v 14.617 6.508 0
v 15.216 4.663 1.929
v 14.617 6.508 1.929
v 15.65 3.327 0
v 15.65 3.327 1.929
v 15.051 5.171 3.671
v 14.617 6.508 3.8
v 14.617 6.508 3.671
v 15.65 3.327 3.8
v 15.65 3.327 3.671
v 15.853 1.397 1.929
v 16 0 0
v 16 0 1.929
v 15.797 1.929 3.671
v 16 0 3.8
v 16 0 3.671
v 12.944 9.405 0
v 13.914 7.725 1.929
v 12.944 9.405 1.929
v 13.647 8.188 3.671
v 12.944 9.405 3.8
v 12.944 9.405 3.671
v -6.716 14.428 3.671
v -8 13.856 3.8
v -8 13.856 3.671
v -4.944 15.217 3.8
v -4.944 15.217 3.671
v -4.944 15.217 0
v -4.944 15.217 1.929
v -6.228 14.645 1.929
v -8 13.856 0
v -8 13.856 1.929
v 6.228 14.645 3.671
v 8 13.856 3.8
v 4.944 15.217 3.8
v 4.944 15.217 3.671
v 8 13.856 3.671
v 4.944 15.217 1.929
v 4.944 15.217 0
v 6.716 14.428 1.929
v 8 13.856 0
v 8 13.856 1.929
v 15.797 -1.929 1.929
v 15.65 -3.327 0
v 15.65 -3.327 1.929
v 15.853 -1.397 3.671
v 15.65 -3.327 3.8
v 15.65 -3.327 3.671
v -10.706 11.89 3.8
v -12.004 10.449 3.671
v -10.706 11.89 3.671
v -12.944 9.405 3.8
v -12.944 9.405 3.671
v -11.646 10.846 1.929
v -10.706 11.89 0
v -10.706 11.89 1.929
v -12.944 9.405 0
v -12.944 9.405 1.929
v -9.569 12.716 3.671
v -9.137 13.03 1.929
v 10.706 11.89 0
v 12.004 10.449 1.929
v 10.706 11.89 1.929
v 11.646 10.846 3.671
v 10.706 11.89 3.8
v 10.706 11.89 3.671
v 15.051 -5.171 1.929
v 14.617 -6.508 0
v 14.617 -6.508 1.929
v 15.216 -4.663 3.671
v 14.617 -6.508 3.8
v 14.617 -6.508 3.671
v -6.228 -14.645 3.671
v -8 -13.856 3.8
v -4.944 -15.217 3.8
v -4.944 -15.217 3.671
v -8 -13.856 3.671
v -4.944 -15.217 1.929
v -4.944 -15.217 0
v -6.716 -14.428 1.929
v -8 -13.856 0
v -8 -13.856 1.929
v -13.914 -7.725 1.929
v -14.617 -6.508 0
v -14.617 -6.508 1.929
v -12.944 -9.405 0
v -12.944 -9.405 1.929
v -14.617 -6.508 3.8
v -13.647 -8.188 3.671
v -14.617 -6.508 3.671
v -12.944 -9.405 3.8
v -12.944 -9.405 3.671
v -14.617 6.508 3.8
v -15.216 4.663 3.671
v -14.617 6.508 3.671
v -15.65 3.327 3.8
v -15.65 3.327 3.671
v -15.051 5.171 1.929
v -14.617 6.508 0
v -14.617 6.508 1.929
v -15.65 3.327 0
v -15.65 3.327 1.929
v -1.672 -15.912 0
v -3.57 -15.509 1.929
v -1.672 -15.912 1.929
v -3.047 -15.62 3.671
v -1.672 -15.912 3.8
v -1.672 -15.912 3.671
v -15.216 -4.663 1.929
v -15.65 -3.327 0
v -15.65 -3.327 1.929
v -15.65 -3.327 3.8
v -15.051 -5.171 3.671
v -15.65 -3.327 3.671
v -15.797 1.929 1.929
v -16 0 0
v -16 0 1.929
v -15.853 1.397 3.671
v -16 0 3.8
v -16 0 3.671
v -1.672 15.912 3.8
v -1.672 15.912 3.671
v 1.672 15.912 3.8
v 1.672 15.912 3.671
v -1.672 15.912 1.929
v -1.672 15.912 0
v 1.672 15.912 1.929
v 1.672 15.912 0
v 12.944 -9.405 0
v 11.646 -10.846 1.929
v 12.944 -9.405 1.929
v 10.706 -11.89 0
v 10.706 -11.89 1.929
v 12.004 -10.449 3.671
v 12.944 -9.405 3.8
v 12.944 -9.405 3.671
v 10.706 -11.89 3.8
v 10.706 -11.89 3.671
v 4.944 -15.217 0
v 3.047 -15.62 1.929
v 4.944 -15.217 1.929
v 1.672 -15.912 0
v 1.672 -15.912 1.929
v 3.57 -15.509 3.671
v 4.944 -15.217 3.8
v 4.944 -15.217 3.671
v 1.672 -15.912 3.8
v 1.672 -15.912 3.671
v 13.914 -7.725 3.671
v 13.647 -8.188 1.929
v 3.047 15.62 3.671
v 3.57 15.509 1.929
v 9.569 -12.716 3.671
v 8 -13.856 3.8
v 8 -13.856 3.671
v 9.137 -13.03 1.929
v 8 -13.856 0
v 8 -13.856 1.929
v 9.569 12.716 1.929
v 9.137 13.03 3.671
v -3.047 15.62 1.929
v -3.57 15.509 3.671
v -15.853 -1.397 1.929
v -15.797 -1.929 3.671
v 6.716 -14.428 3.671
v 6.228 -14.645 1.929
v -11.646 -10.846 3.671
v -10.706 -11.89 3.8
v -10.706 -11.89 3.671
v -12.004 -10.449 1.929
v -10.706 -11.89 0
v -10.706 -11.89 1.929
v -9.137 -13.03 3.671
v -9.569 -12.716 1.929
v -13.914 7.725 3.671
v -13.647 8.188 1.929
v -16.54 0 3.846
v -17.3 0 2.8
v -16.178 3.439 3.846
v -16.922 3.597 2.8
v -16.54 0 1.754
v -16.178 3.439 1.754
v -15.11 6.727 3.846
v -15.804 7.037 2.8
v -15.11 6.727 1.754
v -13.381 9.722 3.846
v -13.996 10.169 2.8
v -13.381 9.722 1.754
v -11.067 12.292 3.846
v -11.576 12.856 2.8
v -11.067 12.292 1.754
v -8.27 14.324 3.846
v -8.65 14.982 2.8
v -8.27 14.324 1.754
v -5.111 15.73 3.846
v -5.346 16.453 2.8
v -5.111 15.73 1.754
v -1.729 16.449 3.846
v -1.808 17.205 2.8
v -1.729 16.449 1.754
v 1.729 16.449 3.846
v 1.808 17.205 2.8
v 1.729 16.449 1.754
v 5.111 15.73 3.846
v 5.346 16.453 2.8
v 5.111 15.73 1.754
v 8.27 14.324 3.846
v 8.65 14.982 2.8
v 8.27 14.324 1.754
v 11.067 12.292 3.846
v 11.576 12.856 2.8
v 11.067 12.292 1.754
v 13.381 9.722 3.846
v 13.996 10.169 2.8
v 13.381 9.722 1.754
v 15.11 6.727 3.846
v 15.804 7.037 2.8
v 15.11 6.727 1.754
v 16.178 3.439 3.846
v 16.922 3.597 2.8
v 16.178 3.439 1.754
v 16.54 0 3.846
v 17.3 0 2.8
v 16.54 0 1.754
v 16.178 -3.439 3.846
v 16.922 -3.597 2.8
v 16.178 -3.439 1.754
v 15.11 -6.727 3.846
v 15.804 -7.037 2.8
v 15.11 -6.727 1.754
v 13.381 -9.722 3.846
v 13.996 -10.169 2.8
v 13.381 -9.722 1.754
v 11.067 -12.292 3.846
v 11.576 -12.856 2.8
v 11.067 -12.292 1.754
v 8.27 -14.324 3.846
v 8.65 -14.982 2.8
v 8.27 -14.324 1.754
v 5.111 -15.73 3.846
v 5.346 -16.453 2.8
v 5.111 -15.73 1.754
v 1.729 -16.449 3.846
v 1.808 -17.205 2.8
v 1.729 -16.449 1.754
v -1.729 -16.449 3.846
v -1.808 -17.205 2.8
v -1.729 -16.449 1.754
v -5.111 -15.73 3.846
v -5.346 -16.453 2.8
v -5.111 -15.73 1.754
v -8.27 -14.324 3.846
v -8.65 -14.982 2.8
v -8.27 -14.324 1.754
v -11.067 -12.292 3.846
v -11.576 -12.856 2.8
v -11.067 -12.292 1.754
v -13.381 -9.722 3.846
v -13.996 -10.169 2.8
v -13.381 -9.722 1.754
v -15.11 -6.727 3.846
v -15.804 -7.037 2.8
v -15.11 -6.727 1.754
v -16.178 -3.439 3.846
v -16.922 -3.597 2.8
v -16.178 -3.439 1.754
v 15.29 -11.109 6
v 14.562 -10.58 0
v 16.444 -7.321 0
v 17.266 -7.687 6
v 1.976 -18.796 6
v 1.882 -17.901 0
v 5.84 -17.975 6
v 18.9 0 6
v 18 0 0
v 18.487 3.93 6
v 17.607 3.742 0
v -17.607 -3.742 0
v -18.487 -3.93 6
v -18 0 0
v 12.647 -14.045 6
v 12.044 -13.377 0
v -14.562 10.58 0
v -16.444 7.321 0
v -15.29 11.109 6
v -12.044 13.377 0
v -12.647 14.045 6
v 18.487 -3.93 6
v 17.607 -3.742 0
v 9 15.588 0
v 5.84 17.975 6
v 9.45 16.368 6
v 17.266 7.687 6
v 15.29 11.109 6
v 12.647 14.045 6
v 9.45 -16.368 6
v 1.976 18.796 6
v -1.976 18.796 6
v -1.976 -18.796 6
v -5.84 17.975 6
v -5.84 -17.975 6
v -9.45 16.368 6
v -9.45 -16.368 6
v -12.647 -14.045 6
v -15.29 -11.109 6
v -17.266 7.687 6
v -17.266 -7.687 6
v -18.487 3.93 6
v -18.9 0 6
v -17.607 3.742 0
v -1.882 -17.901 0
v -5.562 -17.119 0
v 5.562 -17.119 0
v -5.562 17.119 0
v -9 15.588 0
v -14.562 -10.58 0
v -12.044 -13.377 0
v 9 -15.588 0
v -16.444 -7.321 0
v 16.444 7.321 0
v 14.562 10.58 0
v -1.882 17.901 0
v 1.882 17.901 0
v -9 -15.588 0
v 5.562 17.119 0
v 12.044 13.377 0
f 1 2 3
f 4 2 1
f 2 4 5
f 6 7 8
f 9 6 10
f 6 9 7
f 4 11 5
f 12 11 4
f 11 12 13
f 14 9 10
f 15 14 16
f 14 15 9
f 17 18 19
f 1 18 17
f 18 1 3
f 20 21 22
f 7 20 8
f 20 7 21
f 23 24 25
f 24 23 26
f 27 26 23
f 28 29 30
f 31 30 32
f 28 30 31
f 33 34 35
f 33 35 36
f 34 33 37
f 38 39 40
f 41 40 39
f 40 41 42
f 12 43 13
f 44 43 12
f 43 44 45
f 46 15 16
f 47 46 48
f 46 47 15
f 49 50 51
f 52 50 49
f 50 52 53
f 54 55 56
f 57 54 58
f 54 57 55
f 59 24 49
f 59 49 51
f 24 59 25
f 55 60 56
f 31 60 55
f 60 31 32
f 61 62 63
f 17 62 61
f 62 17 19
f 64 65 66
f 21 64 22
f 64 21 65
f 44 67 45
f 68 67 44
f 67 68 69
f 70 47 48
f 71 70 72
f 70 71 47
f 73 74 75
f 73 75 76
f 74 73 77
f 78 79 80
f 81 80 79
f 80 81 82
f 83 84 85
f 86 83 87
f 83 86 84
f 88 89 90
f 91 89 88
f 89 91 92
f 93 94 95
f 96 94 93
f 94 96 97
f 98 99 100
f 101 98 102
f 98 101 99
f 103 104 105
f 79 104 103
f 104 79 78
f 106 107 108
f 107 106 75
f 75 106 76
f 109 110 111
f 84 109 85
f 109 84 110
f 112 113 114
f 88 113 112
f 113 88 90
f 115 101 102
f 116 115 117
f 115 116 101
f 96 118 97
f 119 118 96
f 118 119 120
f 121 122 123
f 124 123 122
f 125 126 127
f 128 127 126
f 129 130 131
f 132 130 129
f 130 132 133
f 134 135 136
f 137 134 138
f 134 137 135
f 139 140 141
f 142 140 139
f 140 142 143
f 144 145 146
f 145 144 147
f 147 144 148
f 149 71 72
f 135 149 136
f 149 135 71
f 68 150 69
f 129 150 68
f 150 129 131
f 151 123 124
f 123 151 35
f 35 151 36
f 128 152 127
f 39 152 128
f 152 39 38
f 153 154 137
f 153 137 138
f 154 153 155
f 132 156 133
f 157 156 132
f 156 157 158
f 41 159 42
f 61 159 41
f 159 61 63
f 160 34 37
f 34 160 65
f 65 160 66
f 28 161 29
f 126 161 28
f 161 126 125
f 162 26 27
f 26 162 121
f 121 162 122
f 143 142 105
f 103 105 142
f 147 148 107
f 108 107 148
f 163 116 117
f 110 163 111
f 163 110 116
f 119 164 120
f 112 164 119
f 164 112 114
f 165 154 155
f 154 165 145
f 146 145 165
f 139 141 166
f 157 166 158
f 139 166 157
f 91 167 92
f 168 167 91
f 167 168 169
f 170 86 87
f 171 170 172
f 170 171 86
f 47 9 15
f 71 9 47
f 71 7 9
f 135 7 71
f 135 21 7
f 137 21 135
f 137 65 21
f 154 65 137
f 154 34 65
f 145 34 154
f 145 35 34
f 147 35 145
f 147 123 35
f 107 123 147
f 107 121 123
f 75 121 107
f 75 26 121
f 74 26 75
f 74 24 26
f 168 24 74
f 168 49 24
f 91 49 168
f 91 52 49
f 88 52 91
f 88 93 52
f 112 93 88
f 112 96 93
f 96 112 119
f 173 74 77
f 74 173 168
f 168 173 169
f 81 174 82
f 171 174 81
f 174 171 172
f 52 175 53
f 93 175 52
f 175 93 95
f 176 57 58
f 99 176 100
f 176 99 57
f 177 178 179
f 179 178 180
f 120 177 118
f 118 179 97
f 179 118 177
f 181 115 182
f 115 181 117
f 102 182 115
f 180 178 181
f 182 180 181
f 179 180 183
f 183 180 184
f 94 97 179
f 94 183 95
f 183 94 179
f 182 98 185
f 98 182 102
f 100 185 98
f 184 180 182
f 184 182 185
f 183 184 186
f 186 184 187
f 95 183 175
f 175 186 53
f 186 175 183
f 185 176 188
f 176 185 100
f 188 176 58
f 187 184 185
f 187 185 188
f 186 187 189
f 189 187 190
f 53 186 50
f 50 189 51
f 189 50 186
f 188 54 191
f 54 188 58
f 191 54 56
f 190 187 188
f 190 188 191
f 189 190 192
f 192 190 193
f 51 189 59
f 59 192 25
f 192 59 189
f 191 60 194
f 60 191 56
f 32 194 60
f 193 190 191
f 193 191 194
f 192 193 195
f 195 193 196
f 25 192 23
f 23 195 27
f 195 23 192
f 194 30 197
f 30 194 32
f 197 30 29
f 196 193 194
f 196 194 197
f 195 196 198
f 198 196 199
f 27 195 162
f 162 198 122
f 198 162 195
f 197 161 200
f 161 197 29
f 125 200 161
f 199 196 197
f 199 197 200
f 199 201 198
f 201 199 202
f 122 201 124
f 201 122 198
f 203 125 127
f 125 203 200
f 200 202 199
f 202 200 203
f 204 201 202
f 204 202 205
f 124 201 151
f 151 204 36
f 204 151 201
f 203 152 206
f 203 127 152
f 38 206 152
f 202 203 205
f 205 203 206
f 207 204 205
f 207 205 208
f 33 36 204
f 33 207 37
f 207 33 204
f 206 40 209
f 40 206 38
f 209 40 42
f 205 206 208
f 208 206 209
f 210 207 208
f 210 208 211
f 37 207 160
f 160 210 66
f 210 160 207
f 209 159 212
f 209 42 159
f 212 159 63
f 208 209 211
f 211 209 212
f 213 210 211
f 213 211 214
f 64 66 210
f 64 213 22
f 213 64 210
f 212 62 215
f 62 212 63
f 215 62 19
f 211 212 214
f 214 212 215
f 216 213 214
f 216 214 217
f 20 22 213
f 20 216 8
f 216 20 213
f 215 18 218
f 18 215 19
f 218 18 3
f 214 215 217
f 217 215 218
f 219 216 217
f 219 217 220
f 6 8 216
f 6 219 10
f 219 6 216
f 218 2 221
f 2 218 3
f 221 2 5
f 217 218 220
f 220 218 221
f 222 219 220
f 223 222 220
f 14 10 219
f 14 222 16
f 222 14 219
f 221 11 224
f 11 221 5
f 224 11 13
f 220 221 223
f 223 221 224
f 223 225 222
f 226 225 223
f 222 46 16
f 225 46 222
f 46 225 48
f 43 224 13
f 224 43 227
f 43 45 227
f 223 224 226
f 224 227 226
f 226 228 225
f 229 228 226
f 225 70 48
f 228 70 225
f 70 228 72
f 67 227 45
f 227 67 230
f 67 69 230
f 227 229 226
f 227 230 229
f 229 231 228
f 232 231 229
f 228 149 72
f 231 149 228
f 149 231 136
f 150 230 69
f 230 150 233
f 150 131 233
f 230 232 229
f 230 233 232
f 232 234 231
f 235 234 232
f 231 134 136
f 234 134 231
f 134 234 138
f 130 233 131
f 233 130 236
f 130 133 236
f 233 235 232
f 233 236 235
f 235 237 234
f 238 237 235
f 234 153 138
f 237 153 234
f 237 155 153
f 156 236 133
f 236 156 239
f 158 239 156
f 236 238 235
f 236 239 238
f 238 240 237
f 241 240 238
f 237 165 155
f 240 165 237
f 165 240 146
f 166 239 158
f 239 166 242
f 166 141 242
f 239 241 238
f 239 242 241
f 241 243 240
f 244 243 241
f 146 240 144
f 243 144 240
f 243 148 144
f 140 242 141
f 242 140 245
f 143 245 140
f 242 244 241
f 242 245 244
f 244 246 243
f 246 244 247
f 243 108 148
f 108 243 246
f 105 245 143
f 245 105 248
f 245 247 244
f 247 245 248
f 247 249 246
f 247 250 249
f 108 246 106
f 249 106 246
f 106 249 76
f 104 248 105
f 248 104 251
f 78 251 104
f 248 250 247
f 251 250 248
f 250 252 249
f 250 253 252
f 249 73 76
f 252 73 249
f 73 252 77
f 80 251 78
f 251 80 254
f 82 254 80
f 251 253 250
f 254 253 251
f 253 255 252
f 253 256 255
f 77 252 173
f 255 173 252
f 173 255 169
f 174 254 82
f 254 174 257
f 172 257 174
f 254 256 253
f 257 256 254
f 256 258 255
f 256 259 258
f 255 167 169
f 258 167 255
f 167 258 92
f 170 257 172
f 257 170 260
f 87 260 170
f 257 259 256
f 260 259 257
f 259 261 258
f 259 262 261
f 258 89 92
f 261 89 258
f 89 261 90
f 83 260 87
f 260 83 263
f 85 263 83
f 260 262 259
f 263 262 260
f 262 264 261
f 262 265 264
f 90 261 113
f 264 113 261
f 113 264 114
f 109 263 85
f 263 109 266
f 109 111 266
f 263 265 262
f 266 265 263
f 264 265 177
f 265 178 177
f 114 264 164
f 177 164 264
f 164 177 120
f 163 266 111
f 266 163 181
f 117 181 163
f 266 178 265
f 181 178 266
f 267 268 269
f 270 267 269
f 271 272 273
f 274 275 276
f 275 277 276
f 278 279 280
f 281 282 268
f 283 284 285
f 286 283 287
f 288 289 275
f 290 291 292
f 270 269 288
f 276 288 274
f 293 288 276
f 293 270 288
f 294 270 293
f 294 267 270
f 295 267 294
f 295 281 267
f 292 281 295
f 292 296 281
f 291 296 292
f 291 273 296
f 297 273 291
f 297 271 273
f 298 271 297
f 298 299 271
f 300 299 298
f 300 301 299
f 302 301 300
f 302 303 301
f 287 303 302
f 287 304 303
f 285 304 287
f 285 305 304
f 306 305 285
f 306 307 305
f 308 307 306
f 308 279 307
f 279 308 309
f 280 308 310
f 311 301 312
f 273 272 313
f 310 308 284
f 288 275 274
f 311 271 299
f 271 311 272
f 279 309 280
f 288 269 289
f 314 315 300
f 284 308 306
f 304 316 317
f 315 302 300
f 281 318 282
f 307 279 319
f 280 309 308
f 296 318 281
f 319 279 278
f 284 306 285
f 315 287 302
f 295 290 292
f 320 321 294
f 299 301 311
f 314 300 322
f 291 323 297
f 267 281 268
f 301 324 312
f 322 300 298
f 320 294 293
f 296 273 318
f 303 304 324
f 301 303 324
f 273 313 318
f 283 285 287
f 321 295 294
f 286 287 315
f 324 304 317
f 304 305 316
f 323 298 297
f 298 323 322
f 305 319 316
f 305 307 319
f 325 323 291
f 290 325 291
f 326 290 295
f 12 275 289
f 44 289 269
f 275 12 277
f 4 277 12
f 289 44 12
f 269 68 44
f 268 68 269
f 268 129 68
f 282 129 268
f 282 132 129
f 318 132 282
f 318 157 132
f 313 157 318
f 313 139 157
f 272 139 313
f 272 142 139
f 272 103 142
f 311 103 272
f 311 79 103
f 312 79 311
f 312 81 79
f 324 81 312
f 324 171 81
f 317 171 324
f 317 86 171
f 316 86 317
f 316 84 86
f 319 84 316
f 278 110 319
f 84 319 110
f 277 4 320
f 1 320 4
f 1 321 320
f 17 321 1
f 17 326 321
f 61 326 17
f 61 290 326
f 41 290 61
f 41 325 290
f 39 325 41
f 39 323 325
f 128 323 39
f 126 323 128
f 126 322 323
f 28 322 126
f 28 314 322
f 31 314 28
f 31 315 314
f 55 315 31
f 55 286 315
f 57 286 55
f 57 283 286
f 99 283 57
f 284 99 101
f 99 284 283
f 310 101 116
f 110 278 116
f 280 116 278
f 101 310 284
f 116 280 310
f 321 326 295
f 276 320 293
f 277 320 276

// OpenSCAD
module body(totalHt, diameter) {
    difference() {
        union() {
            cylinder (h=totalHt-3, d=diameter);
            translate([0,0,4])
            cylinder (h=totalHt-4, d=diameter-3);
            translate([0,0,totalHt])
            rotate_extrude()
            translate([(diameter-3)/2-0.4,0])
            circle(r=1.2 );
        }
        translate([0,0,4])
        cylinder (h=totalHt, d=diameter-4);
    }
}

module lid(diameter) {
    difference() {
        cylinder (h=6, d1=diameter,d2=diameter+(0.05*diameter));
        translate([0,0, -3.2])
        union() {
            cylinder (h=7, d=diameter-4);
            translate([0,0,6])
            rotate_extrude()
            translate([(diameter-3)/2-0.3,0])
            circle(r=1.1 );
        }
    }
}

lid(36);
